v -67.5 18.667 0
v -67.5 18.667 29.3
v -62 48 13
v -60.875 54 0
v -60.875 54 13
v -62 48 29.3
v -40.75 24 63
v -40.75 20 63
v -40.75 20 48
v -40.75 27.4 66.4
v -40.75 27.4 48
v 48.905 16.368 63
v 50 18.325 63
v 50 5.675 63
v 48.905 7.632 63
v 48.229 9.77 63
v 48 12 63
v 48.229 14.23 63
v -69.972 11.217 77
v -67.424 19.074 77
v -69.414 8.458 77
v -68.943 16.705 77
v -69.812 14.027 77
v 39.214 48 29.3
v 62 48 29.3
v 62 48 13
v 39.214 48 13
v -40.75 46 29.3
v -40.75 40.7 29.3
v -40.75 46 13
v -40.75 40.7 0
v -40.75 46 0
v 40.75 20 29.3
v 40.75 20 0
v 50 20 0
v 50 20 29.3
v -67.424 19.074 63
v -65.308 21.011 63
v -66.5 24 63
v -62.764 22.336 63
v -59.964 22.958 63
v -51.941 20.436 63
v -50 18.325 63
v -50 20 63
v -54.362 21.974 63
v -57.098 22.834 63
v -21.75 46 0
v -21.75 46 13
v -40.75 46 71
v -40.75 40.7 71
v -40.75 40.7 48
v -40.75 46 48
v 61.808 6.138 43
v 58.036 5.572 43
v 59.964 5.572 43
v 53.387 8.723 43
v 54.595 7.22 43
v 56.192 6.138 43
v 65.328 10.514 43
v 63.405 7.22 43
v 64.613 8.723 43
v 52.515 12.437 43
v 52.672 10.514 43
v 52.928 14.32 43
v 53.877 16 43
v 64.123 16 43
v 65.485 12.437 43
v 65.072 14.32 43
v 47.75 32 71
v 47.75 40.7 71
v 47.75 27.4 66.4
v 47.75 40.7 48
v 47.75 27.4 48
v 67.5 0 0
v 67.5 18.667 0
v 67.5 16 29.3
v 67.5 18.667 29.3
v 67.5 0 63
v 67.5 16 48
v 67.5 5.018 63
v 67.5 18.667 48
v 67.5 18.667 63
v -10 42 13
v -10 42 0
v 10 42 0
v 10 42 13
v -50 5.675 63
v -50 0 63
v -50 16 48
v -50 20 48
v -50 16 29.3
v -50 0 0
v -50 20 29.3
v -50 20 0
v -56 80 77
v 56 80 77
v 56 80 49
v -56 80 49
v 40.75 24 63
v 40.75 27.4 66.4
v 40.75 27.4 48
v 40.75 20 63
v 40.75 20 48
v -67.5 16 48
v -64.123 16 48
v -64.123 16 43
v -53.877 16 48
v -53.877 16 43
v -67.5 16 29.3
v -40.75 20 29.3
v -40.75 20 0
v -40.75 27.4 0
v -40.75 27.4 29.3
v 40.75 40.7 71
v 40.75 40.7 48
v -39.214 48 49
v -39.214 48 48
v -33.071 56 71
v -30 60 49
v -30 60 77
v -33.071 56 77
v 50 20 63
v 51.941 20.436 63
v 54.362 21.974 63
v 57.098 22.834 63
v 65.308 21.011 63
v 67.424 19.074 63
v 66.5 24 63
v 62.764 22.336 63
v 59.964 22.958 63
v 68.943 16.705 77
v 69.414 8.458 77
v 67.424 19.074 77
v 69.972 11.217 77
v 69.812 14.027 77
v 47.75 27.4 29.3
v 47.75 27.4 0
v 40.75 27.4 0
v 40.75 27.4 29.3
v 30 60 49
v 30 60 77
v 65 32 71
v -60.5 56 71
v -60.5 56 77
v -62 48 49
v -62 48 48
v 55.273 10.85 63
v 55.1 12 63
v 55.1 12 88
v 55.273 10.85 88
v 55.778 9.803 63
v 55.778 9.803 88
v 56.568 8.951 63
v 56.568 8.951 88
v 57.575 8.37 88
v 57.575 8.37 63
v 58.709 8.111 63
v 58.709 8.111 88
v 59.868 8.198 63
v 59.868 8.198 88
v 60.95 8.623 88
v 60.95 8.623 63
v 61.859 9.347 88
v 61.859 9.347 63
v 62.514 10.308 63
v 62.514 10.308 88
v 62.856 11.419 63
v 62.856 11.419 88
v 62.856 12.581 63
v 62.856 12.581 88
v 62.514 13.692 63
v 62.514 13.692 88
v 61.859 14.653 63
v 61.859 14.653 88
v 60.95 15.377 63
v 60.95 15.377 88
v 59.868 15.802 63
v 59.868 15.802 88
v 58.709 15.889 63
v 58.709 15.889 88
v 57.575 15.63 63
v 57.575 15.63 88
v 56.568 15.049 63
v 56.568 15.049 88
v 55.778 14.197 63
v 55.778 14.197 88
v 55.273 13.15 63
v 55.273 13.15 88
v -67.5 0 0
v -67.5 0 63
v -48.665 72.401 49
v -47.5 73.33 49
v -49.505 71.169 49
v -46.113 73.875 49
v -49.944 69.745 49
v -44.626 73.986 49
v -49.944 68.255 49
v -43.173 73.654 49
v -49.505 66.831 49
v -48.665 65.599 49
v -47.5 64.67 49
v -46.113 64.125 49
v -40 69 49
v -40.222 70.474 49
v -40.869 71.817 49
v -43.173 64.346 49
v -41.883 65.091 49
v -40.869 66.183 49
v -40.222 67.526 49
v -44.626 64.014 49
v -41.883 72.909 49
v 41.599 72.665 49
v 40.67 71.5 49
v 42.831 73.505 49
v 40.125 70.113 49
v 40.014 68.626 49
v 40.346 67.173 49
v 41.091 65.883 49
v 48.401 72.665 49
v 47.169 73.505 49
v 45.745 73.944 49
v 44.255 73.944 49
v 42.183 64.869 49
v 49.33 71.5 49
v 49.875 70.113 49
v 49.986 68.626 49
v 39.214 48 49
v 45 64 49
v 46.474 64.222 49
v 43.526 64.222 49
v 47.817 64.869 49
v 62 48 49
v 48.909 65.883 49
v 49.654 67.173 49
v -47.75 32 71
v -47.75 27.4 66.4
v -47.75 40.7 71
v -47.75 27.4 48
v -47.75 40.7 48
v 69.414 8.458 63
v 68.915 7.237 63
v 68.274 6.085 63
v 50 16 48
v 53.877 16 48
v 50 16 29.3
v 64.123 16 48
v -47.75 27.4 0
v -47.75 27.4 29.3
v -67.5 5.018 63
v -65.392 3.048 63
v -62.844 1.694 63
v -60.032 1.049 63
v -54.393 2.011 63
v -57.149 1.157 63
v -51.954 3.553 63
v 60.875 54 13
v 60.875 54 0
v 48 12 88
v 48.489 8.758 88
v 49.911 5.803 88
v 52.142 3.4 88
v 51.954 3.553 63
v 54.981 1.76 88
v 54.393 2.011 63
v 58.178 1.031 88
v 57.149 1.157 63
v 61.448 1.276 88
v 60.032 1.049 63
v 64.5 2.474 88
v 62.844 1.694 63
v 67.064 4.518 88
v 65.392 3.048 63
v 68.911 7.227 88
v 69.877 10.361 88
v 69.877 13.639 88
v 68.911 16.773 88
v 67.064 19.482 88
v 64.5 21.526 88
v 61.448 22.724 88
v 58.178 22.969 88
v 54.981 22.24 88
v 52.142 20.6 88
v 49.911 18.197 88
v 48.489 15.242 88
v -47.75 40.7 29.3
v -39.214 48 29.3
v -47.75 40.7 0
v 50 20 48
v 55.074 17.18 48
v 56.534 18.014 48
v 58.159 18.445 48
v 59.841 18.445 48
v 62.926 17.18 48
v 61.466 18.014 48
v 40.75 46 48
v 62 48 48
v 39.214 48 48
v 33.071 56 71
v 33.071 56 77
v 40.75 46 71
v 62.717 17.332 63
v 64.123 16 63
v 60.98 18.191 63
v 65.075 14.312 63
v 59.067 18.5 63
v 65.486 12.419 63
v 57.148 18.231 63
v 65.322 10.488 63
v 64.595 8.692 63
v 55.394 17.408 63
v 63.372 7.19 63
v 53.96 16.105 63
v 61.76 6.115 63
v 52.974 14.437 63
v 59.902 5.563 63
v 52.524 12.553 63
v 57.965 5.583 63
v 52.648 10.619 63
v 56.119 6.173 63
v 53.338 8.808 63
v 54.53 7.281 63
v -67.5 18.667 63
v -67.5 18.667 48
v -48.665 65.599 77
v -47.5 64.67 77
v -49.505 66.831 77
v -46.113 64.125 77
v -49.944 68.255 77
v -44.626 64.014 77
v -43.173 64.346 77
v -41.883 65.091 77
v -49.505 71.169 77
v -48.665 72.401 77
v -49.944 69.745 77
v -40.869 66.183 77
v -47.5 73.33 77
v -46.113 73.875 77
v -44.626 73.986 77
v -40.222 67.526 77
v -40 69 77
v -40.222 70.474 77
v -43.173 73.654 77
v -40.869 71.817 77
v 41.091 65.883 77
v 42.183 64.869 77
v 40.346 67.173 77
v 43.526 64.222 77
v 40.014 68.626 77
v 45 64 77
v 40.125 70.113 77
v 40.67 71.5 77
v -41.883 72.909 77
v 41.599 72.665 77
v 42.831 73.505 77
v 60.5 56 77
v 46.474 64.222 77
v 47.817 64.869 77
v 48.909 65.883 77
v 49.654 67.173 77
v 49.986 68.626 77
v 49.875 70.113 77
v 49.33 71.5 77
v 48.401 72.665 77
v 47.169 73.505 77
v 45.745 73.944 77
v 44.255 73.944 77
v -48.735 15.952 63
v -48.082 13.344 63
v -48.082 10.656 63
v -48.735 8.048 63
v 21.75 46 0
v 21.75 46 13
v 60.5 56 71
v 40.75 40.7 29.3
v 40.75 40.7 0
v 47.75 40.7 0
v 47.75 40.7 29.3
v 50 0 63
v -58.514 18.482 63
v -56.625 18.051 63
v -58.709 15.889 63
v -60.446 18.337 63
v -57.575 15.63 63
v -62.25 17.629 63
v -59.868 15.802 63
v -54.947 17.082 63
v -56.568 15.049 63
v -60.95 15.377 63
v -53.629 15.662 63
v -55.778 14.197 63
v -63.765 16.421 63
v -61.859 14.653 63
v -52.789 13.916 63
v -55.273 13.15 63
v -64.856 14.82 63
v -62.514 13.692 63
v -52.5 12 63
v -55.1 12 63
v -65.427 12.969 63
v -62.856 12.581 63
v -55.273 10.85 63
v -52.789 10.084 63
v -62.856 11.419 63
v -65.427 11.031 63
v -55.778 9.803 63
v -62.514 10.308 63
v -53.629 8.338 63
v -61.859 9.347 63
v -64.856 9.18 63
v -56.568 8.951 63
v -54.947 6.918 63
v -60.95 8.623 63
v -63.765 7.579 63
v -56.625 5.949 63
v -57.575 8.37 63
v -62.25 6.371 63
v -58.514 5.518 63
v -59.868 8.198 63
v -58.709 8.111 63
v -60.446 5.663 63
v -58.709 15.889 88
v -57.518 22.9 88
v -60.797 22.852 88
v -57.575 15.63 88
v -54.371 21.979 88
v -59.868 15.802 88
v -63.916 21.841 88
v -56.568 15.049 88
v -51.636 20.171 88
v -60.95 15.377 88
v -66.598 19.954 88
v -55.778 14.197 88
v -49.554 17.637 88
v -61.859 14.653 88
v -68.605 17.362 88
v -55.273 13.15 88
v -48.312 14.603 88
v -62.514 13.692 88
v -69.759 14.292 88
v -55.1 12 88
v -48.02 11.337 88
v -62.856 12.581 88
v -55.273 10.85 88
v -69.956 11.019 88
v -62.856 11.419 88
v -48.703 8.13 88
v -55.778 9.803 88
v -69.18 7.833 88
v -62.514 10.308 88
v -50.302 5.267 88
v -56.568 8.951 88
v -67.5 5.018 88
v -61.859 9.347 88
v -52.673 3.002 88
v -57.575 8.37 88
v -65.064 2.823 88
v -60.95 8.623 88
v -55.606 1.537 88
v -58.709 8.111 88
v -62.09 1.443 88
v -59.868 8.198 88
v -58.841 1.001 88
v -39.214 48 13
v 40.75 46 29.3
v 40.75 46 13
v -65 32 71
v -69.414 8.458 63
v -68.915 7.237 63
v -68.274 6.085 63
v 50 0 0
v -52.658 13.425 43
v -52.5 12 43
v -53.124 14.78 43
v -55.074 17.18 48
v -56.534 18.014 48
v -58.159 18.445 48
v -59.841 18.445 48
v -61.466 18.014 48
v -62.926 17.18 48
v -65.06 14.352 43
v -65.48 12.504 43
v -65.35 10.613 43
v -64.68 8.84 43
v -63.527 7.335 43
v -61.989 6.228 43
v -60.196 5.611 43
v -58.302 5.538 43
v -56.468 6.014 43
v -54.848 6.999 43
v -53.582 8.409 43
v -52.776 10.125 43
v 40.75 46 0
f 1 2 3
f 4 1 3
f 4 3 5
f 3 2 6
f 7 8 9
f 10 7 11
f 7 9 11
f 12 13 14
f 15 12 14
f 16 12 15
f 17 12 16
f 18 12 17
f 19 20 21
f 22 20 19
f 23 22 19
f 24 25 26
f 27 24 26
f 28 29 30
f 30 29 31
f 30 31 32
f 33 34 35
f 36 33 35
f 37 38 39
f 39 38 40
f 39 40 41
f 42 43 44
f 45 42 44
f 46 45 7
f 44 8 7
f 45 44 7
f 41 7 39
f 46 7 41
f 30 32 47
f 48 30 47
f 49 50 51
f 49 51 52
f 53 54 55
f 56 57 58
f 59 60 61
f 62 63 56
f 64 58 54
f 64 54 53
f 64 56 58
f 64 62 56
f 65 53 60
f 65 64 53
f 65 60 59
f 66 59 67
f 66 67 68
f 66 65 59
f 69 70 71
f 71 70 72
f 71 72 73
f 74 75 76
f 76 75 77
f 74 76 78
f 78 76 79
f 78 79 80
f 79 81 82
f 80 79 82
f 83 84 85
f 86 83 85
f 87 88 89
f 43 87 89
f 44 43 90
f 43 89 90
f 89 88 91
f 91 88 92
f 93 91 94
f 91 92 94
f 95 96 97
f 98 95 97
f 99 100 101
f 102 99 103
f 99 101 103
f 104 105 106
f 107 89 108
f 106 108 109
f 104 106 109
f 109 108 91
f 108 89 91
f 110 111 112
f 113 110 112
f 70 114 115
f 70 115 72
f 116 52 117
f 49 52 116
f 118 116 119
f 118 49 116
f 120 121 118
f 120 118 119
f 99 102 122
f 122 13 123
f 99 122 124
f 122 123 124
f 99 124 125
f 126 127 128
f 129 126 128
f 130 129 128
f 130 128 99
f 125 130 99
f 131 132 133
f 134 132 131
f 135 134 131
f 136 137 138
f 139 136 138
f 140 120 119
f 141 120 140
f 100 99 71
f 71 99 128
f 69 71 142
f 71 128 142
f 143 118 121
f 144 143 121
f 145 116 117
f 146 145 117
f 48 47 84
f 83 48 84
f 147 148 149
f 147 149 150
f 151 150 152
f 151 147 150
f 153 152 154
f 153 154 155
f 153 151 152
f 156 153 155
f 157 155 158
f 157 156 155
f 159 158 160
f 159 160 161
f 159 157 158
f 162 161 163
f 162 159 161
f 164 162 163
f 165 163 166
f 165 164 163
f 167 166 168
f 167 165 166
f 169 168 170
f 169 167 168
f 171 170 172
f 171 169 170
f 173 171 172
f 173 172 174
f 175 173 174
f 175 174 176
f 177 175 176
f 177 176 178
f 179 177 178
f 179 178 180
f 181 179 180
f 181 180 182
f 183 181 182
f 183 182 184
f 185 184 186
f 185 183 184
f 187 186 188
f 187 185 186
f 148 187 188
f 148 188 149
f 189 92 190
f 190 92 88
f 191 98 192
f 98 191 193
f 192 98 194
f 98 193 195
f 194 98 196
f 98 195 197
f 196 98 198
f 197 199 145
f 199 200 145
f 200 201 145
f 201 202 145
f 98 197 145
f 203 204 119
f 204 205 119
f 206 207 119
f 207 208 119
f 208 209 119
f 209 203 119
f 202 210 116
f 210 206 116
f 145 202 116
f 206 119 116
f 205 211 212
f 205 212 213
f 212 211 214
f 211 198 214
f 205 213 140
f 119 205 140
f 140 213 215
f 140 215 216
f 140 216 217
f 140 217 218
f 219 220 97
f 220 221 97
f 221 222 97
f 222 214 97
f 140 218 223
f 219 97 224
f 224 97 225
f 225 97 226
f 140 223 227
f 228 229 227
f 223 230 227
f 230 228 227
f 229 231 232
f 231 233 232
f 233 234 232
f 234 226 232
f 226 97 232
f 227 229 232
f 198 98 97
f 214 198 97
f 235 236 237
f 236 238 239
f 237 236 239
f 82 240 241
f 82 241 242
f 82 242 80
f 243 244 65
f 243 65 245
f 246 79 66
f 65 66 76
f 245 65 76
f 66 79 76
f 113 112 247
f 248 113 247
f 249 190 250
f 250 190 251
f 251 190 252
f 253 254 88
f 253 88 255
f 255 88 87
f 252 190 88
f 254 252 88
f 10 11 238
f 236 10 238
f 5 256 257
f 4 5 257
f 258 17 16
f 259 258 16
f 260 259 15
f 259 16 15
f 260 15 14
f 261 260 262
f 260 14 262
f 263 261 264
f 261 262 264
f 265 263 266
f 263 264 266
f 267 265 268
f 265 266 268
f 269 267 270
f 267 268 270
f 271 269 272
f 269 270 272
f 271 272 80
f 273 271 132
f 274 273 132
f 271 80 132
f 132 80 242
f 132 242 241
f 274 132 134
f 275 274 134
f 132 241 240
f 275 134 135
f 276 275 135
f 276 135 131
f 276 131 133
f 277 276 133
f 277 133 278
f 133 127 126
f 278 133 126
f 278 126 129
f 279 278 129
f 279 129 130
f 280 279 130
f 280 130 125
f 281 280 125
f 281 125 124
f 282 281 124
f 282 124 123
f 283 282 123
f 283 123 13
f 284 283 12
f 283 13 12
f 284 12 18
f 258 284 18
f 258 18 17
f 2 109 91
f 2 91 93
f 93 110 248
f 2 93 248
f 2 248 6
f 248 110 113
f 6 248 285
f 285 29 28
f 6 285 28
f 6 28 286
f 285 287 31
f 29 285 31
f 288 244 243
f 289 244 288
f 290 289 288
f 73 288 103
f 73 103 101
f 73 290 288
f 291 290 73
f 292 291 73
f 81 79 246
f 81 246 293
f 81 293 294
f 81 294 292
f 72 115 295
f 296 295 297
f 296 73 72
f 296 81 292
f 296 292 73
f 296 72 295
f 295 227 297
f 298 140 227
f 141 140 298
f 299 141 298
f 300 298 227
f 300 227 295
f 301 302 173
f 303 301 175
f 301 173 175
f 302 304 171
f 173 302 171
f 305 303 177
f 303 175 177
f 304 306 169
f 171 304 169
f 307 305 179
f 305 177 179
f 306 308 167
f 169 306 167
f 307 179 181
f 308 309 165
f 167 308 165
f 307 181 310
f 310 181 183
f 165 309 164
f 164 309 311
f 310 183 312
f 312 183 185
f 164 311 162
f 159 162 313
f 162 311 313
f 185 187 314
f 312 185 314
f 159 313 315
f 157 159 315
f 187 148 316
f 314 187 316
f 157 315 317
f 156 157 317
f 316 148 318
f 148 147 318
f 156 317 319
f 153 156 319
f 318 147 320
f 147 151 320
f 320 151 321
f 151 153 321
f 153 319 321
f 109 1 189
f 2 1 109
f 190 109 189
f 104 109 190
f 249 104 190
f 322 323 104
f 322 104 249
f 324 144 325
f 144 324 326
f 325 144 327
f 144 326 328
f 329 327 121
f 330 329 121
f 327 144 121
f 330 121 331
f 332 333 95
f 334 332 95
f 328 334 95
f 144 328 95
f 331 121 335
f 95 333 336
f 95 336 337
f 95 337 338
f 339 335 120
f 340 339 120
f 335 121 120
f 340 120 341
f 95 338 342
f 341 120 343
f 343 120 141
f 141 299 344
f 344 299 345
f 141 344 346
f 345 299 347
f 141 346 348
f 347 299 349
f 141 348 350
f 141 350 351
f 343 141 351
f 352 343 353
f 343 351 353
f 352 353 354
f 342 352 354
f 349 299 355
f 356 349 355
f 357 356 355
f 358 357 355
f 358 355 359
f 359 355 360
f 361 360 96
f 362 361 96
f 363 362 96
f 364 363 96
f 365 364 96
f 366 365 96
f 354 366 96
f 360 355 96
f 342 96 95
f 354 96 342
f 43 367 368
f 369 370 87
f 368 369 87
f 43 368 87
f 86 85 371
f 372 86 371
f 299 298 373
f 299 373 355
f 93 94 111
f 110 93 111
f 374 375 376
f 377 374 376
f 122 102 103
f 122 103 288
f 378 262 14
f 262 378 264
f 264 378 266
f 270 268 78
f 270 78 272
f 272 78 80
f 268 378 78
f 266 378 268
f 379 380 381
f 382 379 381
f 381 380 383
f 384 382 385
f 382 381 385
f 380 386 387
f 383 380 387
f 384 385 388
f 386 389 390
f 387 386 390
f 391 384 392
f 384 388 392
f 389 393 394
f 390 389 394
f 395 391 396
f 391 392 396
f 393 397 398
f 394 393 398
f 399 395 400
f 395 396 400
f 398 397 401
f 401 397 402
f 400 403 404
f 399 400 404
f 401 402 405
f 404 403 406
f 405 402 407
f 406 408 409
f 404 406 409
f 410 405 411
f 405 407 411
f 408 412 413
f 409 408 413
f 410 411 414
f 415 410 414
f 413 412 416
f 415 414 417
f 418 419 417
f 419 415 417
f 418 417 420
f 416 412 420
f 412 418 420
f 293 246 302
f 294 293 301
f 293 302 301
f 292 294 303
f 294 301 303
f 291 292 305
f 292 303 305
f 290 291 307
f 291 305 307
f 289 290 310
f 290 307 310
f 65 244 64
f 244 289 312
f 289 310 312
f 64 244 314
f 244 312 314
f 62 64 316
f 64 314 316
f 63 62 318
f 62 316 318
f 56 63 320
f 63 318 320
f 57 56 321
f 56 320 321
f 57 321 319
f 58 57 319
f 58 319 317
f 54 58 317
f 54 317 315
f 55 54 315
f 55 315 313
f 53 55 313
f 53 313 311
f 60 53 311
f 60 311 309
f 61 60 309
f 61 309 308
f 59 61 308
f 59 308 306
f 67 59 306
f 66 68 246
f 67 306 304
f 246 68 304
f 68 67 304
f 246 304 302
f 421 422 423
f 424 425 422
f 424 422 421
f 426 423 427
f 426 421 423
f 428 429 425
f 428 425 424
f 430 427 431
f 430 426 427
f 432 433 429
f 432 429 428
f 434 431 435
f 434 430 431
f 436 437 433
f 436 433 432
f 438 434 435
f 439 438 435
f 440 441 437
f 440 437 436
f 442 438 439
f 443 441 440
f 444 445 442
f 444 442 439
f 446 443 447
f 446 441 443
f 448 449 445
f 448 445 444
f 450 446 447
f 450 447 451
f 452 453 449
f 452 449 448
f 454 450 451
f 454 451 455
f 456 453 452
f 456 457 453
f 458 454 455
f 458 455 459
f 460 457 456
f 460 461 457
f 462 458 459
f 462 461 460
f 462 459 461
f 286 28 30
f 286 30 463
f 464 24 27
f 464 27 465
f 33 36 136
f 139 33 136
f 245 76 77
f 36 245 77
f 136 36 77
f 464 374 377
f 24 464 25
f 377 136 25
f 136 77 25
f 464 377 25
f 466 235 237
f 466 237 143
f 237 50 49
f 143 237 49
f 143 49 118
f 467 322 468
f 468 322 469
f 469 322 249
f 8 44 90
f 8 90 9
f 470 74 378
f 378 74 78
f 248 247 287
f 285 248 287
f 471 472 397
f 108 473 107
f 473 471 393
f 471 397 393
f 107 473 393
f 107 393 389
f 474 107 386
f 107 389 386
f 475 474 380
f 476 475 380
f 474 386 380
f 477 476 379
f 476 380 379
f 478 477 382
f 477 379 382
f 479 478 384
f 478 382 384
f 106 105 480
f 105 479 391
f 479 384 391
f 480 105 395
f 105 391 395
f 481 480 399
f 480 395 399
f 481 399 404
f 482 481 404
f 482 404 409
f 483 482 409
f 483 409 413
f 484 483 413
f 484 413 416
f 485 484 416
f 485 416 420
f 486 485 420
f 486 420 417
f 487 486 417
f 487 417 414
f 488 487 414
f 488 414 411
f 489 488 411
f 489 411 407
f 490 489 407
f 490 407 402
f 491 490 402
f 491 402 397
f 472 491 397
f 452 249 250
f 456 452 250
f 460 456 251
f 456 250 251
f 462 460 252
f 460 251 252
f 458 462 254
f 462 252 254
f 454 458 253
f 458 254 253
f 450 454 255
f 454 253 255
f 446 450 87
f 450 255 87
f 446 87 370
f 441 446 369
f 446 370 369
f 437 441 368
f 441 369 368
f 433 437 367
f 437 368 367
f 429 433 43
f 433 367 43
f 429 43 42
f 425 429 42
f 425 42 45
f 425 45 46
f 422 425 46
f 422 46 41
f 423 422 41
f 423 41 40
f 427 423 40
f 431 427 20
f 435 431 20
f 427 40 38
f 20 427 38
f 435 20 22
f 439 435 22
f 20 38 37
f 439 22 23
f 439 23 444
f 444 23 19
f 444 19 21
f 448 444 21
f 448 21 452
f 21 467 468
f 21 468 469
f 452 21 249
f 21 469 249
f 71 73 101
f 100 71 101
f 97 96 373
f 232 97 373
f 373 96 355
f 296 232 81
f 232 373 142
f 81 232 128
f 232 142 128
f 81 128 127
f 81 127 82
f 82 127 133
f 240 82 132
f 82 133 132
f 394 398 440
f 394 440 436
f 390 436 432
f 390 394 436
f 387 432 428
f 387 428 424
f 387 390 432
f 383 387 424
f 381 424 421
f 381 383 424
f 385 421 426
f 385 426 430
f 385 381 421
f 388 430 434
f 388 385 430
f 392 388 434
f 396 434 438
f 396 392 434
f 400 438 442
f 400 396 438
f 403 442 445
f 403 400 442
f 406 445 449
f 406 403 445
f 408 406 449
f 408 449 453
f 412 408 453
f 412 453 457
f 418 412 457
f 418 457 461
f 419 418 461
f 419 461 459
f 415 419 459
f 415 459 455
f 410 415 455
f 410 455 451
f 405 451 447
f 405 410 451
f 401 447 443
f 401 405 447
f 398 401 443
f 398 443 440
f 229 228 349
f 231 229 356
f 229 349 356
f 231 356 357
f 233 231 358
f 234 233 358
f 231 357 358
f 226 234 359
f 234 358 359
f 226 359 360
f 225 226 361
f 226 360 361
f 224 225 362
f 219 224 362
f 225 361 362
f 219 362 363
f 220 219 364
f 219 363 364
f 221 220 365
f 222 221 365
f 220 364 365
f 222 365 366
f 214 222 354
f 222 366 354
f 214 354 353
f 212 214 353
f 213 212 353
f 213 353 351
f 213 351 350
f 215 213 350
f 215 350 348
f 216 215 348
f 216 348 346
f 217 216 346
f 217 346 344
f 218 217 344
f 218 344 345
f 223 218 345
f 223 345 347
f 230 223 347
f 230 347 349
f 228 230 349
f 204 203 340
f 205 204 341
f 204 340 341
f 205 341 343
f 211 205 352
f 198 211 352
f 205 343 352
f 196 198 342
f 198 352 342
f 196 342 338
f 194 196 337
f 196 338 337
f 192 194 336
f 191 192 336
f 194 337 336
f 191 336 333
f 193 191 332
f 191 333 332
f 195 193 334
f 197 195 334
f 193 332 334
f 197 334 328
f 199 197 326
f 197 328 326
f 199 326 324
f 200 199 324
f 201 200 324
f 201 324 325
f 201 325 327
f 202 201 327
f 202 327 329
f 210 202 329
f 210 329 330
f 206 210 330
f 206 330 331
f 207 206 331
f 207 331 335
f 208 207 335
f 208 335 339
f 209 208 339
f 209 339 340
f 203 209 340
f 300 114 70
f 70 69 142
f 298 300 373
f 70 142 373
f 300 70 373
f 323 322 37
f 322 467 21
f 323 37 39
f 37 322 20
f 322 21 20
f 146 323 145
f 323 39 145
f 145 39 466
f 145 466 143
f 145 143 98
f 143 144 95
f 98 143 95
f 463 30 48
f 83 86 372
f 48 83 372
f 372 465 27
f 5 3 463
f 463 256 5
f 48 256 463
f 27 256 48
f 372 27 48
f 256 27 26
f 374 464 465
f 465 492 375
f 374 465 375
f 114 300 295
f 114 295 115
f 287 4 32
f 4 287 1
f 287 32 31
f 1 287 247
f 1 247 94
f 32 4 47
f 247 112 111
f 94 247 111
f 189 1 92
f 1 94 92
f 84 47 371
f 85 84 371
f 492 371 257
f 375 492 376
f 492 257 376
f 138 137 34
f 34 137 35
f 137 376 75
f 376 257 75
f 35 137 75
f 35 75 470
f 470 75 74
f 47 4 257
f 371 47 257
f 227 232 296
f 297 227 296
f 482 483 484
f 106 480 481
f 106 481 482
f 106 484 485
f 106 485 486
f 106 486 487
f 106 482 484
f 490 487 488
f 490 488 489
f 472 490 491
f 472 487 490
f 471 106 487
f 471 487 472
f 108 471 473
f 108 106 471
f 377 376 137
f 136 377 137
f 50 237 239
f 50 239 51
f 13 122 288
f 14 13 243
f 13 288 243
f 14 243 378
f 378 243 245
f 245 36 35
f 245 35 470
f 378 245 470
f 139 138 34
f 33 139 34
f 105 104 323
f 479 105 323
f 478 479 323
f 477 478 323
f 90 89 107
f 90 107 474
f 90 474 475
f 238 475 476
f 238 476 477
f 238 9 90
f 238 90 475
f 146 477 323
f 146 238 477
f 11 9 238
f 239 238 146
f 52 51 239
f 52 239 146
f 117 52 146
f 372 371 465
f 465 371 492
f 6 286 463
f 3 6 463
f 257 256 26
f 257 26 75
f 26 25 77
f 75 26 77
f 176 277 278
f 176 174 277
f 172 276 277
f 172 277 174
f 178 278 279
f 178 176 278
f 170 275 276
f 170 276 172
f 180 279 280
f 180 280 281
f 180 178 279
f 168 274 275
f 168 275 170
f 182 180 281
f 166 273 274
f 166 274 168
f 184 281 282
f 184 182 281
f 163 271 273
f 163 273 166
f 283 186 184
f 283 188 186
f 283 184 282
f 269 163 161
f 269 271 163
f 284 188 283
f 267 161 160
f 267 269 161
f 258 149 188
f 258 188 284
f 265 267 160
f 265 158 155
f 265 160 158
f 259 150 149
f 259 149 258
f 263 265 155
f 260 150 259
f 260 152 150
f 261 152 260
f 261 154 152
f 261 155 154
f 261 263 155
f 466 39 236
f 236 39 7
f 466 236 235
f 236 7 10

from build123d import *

# Parameters (mm, degrees)
SZKIC1_W                        = 1
SZKIC1_H                        = 32
DODANIE_WYCI_GNI_CIE1_DEPTH     = 67.5
WYTNIJ_WYCI_GNI_CIE1_DEPTH      = 94
WYTNIJ_WYCI_GNI_CIE2_DEPTH      = 36
WYTNIJ_WYCI_GNI_CIE2_DEPTH_BACK = 135
WYTNIJ_WYCI_GNI_CIE6_REACH      = 131.943
SZKIC6_R                        = 5
SZKIC7_R                        = 6.5
WYTNIJ_WYCI_GNI_CIE7_DEPTH      = 20
SZKIC8_R                        = 11
SZKIC8_R_2                      = 3.9
DODANIE_WYCI_GNI_CIE2_DEPTH     = 25
WYTNIJ_WYCI_GNI_CIE8_DEPTH      = 94


with BuildPart() as part:
    # Szkic1 → Dodanie-wyciągnięcie1 (new, symmetric)
    with BuildSketch(Plane(origin=(0, 0, 0), x_dir=(0, 0, -1), z_dir=(1, 0, 0))):
        Polygon((-63, 24), (-71, 32), (-71, 56), (-77, 56), (-77, 80), (-49, 80), (-49, 16), (-29.3, 16), (-29.3, 48), (-13, 48), (-13, 54), (0, 54), (0, 0), (-63, 0), align=None)
        with Locations((-48.5, 32)):
            Rectangle(SZKIC1_W, SZKIC1_H)
    extrude(amount=DODANIE_WYCI_GNI_CIE1_DEPTH, both=True)

    # Szkic2 → Wytnij-wyciągnięcie1 (cut)
    with BuildSketch(Plane(origin=(0, 0, 0), x_dir=(-1, 0, 0), z_dir=(0, 0, -1))):
        Polygon((50, 0), (50, 20), (40.75, 20), (40.75, 27.4), (47.75, 27.4), (47.75, 40.7), (40.75, 40.7), (40.75, 46), (21.75, 46), (10, 42), (-10, 42), (-21.75, 46), (-40.75, 46), (-40.75, 40.7), (-47.75, 40.7), (-47.75, 27.4), (-40.75, 27.4), (-40.75, 20), (-50, 20), (-50, 0), align=None)
    extrude(amount=-WYTNIJ_WYCI_GNI_CIE1_DEPTH, mode=Mode.SUBTRACT)

    # Szkic4 → Wytnij-wyciągnięcie2 (cut, two sides: drawn at the far end of the back side and taken through both)
    with BuildSketch(Plane(origin=(0, 0, 49), x_dir=(-1, 0, 0), z_dir=(0, 0, -1)).offset(-WYTNIJ_WYCI_GNI_CIE2_DEPTH_BACK)):
        Polygon((40.75, 40.7), (40.75, 46), (30, 60), (-30, 60), (-40.75, 46), (-40.75, 40.7), align=None)
    extrude(amount=WYTNIJ_WYCI_GNI_CIE2_DEPTH + WYTNIJ_WYCI_GNI_CIE2_DEPTH_BACK, mode=Mode.SUBTRACT)

    # Szkic6 → Wytnij-wyciągnięcie6 (cut, up to next)
    with BuildSketch(Plane.XY.offset(77), mode=Mode.PRIVATE) as wytnij_wyci_gni_cie6_sk1:
        with Locations((-45, 69)):
            Circle(SZKIC6_R)
    wytnij_wyci_gni_cie6_tool1 = extrude(wytnij_wyci_gni_cie6_sk1.sketch, amount=-WYTNIJ_WYCI_GNI_CIE6_REACH, mode=Mode.PRIVATE) & part.part
    # Szkic6 → Wytnij-wyciągnięcie6 (cut, up to next)
    with BuildSketch(Plane.XY.offset(77), mode=Mode.PRIVATE) as wytnij_wyci_gni_cie6_sk2:
        with Locations(Location((45, 69, 0), (0, 0, 270))):
            Circle(SZKIC6_R)
    wytnij_wyci_gni_cie6_tool2 = extrude(wytnij_wyci_gni_cie6_sk2.sketch, amount=-WYTNIJ_WYCI_GNI_CIE6_REACH, mode=Mode.PRIVATE) & part.part
    add(wytnij_wyci_gni_cie6_tool1.solids().sort_by_distance((-45, 69, 77))[0], mode=Mode.SUBTRACT)
    add(wytnij_wyci_gni_cie6_tool2.solids().sort_by_distance((45, 69, 77))[0], mode=Mode.SUBTRACT)

    # Szkic7 → Wytnij-wyciągnięcie7 (cut)
    with BuildSketch(Plane.XY.offset(63)):
        with Locations((-59, 12)):
            Circle(SZKIC7_R)
        with Locations(Location((59, 12, 0), (0, 0, 37.979872445))):
            Circle(SZKIC7_R)
    extrude(amount=-WYTNIJ_WYCI_GNI_CIE7_DEPTH, mode=Mode.SUBTRACT)

    # Szkic8 → Dodanie-wyciągnięcie2 (add)
    # profile 1 of 2: a face of its own
    with BuildSketch(Plane.XY.offset(63)):
        with Locations(Location((-59, 12, 0), (0, 0, 219.400568754))):
            Circle(SZKIC8_R)
        with Locations((-59, 12)):
            Circle(SZKIC8_R_2, mode=Mode.SUBTRACT)
    # profile 2 of 2: a face of its own
    with BuildSketch(Plane.XY.offset(63)):
        with Locations(Location((59, 12, 0), (0, 0, 180))):
            Circle(SZKIC8_R)
        with Locations(Location((59, 12, 0), (0, 0, 180))):
            Circle(SZKIC8_R_2, mode=Mode.SUBTRACT)
    extrude(amount=DODANIE_WYCI_GNI_CIE2_DEPTH)

    # Szkic9 → Wytnij-wyciągnięcie8 (cut)
    with BuildSketch(Plane.XY.offset(77)):
        Polygon((-71, 0), (-56, 80), (56, 80), (71, 0), (104.197926063, 0), (104.197926063, 108.650562656), (-104.197926063, 108.650562656), (-104.197926063, 0), align=None)
    extrude(amount=-WYTNIJ_WYCI_GNI_CIE8_DEPTH, mode=Mode.SUBTRACT)


solid = part.part
